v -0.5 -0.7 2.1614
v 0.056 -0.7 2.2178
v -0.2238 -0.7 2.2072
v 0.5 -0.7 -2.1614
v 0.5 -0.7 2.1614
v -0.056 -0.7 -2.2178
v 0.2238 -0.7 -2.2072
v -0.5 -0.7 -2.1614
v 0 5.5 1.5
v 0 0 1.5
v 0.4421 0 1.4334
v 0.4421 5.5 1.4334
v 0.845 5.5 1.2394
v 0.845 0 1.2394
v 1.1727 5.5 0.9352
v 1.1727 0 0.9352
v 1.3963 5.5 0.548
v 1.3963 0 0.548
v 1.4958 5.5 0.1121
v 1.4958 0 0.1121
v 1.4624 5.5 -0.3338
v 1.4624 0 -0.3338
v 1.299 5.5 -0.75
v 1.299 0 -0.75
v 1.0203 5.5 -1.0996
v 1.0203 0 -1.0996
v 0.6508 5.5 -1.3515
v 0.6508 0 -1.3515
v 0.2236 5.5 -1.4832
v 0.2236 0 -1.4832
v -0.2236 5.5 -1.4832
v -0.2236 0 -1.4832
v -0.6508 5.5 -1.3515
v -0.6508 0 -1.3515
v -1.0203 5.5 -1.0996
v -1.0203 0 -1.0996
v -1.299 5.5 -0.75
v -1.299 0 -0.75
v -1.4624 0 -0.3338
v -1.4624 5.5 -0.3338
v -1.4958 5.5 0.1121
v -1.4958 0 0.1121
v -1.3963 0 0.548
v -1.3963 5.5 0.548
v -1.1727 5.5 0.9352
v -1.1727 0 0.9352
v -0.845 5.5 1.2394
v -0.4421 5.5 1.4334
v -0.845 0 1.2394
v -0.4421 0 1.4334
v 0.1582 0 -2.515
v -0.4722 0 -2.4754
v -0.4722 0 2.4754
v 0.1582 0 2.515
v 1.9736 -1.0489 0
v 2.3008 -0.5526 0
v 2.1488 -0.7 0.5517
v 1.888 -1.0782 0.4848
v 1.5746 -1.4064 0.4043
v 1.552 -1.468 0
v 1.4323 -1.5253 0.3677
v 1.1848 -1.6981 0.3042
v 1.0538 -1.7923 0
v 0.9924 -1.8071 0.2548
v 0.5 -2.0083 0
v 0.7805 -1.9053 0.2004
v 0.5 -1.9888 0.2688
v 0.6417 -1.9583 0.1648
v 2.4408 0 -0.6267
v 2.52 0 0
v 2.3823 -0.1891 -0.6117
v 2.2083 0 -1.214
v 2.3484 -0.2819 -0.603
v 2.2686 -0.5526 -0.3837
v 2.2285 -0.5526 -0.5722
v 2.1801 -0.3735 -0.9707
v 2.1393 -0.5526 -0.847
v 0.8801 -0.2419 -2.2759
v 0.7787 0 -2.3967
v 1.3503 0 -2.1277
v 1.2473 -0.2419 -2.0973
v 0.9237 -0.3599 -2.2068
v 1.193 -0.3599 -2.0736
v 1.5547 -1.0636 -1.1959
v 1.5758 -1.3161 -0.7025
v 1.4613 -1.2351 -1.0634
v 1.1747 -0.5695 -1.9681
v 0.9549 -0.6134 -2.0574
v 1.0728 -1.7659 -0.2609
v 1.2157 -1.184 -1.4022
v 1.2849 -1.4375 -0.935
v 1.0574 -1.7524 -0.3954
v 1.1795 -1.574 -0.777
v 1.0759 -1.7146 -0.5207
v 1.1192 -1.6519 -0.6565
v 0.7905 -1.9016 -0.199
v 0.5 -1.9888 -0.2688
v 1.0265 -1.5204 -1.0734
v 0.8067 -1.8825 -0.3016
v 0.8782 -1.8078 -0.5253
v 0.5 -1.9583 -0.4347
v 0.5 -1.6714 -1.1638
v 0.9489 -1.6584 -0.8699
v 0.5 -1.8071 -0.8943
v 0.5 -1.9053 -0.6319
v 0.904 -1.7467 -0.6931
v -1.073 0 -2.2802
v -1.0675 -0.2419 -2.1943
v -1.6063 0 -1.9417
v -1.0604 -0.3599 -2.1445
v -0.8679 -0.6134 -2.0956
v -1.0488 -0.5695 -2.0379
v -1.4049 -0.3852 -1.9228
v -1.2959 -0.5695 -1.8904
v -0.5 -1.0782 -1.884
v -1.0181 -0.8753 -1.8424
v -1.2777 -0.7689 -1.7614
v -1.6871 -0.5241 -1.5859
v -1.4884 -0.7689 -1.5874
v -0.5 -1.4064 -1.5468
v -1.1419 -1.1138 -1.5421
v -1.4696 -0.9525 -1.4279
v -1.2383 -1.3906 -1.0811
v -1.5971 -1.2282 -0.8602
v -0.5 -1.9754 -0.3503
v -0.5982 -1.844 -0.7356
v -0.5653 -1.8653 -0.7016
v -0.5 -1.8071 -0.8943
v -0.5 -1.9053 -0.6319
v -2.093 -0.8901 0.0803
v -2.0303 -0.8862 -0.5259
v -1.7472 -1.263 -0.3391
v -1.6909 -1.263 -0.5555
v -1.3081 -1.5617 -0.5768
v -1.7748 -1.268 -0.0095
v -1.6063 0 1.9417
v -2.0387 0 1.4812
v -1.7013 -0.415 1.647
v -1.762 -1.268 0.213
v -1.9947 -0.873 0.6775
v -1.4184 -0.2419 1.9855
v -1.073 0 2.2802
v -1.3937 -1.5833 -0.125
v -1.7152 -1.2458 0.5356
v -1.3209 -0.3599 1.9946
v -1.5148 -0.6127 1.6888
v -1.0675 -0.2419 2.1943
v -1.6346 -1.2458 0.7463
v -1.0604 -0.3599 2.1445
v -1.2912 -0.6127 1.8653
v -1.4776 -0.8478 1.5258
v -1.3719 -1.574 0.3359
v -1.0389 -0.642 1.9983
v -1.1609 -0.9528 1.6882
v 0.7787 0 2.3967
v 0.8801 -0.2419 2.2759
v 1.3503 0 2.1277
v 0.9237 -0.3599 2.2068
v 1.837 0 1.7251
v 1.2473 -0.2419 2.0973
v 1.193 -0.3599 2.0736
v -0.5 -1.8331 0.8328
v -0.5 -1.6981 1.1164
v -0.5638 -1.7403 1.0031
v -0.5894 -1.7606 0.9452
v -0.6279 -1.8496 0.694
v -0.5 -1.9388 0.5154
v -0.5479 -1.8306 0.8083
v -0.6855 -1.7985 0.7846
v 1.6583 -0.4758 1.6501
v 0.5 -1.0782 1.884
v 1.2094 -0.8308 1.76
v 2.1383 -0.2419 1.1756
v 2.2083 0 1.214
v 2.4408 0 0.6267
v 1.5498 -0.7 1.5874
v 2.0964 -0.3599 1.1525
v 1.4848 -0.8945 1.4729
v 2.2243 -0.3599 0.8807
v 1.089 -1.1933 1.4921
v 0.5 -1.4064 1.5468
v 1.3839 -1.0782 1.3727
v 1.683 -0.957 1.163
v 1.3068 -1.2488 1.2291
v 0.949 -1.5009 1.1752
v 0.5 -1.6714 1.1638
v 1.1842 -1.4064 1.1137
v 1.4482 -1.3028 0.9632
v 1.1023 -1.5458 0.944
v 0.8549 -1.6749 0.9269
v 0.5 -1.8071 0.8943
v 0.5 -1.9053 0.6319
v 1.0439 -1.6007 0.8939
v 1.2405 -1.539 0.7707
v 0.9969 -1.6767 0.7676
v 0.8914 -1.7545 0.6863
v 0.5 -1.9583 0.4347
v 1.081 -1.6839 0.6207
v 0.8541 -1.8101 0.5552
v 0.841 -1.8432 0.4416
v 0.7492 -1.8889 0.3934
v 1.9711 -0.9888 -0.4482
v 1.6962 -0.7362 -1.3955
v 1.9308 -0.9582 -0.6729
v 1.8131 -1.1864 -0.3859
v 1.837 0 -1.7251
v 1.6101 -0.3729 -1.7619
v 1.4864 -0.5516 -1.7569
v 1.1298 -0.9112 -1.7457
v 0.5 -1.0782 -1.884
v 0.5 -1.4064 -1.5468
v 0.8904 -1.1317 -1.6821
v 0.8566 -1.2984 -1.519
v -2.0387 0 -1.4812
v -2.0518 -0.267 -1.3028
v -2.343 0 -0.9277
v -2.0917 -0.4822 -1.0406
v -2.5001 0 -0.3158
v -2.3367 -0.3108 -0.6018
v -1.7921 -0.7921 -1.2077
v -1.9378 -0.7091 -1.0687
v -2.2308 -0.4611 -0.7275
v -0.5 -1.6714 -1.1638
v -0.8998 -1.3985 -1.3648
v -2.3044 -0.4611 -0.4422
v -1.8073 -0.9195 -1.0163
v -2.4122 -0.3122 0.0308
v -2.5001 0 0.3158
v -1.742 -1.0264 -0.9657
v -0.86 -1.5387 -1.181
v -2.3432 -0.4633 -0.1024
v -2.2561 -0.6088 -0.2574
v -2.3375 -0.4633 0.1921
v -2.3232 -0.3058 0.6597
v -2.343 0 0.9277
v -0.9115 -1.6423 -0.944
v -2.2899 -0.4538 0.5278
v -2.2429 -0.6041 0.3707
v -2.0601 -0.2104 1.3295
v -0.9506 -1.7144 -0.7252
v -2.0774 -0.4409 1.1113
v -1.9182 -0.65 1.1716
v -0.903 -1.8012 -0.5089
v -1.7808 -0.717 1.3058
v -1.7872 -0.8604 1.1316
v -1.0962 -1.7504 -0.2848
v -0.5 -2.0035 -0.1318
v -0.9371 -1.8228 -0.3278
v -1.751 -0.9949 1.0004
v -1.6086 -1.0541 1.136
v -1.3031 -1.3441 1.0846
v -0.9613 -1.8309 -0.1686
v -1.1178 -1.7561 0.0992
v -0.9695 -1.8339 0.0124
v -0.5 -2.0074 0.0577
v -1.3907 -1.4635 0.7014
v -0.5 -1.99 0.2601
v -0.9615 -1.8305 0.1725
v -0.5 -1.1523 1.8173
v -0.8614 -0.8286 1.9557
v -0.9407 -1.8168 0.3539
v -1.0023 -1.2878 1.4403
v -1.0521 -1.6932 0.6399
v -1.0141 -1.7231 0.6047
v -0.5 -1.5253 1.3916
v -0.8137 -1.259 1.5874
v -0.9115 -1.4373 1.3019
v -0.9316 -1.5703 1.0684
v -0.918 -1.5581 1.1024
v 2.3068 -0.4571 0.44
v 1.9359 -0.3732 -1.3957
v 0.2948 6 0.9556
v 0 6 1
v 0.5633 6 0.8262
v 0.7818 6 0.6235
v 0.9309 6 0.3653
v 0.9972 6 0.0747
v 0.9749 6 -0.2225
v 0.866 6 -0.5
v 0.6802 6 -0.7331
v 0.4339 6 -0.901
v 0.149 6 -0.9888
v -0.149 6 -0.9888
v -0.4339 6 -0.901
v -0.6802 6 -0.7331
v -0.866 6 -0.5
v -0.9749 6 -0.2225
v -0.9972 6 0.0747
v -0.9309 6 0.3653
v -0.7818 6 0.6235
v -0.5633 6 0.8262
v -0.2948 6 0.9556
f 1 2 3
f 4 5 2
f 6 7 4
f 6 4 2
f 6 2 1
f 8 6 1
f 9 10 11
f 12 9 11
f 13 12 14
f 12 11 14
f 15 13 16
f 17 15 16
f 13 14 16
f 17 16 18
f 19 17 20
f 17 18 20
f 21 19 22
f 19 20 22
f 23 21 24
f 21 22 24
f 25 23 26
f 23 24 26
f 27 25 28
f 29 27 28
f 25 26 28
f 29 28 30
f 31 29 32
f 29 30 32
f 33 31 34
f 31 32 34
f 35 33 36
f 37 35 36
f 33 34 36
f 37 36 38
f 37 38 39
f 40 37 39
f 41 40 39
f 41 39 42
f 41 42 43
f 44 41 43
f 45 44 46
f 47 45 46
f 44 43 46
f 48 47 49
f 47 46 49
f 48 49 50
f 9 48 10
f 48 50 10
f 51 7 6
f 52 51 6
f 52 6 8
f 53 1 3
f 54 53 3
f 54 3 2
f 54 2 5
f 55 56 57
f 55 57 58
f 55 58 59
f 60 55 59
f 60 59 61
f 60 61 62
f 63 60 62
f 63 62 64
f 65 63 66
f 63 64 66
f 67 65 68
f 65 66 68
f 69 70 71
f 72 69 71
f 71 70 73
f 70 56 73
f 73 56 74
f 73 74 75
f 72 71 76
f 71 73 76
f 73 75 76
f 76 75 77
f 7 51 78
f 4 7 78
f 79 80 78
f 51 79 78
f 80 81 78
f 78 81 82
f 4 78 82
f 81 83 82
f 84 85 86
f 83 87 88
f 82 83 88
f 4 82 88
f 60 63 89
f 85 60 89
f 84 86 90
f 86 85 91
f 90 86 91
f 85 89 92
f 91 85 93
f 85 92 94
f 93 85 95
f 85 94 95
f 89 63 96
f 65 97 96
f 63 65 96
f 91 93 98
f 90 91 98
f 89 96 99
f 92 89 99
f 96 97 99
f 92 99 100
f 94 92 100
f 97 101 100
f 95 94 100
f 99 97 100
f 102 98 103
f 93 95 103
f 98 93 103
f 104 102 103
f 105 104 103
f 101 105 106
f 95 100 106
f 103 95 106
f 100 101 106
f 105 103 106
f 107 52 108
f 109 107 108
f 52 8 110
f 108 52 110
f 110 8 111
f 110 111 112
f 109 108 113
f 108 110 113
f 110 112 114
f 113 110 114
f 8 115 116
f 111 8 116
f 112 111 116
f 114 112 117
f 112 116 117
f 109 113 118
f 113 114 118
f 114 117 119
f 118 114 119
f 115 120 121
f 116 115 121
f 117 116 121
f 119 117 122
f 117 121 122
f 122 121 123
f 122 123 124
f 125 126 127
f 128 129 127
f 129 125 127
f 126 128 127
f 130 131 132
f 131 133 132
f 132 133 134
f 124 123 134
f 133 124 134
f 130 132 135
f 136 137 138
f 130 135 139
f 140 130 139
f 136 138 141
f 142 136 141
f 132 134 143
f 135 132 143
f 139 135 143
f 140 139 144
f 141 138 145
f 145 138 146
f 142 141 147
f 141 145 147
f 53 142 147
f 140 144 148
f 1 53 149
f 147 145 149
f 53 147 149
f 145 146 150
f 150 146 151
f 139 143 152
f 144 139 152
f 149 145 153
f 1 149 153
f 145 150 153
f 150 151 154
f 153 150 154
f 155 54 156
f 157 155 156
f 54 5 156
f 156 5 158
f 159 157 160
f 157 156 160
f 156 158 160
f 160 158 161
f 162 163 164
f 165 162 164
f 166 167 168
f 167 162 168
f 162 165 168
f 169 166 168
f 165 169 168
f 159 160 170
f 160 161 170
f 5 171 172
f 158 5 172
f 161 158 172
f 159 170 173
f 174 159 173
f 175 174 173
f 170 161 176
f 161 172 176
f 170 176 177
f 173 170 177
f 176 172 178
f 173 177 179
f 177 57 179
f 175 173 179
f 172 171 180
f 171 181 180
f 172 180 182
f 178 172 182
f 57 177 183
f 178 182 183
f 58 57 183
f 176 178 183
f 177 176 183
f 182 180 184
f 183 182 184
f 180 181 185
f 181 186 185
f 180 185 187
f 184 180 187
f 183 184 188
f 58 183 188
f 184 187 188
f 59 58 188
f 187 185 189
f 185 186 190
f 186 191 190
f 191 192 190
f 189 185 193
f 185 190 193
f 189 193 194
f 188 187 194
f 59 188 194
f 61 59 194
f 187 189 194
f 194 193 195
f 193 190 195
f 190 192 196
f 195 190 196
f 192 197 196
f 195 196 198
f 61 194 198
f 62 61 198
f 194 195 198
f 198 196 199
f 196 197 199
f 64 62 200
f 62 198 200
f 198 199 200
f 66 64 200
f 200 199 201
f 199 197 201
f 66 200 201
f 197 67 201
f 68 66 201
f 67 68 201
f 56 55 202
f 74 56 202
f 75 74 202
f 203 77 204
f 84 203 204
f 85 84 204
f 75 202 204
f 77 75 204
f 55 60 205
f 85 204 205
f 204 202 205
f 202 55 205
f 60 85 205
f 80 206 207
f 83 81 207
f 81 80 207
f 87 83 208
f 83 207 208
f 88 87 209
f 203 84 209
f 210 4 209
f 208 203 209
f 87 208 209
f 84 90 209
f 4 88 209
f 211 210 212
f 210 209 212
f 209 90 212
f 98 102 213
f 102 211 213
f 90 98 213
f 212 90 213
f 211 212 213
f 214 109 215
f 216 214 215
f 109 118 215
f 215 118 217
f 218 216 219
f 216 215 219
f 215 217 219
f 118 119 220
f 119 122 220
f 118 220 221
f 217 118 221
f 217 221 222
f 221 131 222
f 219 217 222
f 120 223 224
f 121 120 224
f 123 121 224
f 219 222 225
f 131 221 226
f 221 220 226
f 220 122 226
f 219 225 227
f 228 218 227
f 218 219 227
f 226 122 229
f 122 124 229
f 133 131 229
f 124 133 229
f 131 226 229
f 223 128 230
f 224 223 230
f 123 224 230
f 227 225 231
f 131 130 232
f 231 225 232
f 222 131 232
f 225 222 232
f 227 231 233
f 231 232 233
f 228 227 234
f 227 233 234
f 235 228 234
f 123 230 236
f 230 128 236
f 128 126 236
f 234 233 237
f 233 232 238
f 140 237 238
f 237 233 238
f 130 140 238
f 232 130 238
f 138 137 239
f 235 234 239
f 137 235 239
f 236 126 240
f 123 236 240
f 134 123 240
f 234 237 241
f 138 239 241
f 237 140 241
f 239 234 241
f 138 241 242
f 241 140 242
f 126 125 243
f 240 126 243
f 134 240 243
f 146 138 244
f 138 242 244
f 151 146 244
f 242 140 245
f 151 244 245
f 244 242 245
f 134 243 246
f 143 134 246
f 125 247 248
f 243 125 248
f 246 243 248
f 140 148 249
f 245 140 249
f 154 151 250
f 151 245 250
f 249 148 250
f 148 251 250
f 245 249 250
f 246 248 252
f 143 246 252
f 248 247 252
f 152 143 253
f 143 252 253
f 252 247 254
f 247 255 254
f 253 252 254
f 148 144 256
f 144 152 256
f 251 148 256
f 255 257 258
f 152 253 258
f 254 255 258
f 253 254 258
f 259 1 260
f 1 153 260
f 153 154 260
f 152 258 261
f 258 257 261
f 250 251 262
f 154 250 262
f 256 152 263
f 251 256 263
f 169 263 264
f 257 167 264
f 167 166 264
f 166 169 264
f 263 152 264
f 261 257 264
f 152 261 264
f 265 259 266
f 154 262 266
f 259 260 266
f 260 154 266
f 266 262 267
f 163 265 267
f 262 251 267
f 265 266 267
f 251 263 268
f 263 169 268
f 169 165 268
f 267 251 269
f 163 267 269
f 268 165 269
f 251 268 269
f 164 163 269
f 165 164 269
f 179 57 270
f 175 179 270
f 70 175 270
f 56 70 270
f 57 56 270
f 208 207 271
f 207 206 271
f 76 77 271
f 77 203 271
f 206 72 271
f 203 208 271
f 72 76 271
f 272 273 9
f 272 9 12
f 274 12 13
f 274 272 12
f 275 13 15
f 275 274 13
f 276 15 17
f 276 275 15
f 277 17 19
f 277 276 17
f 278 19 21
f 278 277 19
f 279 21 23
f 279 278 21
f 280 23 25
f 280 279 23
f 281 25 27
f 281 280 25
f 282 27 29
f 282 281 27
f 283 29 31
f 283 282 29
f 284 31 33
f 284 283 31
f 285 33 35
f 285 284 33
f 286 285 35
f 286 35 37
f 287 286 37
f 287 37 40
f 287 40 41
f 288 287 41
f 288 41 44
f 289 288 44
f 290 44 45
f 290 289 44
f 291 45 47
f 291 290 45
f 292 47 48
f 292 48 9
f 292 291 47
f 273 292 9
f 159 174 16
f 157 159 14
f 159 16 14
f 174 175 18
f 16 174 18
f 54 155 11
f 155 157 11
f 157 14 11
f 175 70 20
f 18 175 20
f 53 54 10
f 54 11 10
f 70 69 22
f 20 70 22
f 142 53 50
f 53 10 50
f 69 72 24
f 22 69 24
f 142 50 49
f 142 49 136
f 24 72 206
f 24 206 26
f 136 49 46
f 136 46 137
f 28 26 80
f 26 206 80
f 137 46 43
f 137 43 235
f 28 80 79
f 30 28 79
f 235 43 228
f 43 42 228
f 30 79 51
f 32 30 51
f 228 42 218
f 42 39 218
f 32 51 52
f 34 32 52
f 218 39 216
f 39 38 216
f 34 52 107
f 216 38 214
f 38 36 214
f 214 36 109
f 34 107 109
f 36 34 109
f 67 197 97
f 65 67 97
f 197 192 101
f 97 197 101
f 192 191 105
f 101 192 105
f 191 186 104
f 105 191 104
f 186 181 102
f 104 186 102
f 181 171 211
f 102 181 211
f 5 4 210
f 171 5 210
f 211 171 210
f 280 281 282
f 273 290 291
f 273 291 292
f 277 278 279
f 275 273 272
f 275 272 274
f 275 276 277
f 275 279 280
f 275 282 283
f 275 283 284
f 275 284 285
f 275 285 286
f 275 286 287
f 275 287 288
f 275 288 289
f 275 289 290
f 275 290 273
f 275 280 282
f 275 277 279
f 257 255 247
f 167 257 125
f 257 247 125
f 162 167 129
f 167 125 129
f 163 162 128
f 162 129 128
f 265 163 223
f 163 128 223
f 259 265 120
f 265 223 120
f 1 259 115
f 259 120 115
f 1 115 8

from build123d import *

# Parameters (mm, degrees)
SKETCH1_R               = 1.5
BOSS_EXTRUDE1_DEPTH     = 6
CUT_EXTRUDE1_DEPTH      = 7.97859592
CUT_EXTRUDE1_DEPTH_BACK = 7.97859592
CHAMFER1_SIZE           = 0.5


with BuildPart() as part:
    # Sketch1 → Boss-Extrude1 (new body)
    with BuildSketch(Plane(origin=(0, 0, 0), x_dir=(1, 0, 0), z_dir=(0, 1, 0))):
        with Locations(Location((0, 0, 0), (0, 0, 270))):
            Circle(SKETCH1_R)
    extrude(amount=BOSS_EXTRUDE1_DEPTH)

    # Sketch2 → Revolve1 (revolve)
    with BuildSketch(Plane.XY, mode=Mode.PRIVATE) as revolve1_sk:
        with BuildLine():
            Line((0, 0), (-2.52, 0))
            ThreePointArc((-2.52, 0), (-1.585449748, -1.440539697), (0, -2.1))
            Line((0, -2.1), (0, 0))
        make_face()
    revolve(revolve1_sk.sketch.rotate(Axis((0, -2.1, 0), (0, 1, 0)), 180), axis=Axis((0, -2.1, 0), (0, 1, 0)))

    # Sketch3 → Cut-Extrude1 (cut, two sides: drawn at the far end of the back side and taken through both)
    with BuildSketch(Plane.XY.offset(-CUT_EXTRUDE1_DEPTH_BACK)):
        Polygon((-0.5, -0.7), (0, -0.7), (0.5, -0.7), (0.5, -4.6380618), (-0.5, -4.6380618), align=None)
    extrude(amount=CUT_EXTRUDE1_DEPTH + CUT_EXTRUDE1_DEPTH_BACK, mode=Mode.SUBTRACT)

    # Chamfer1
    chamfer1_edges = [part.edges().sort_by_distance(p)[0] for p in [
        (0, 6, -1.5),
    ]]
    chamfer(chamfer1_edges, length=CHAMFER1_SIZE)


solid = part.part
